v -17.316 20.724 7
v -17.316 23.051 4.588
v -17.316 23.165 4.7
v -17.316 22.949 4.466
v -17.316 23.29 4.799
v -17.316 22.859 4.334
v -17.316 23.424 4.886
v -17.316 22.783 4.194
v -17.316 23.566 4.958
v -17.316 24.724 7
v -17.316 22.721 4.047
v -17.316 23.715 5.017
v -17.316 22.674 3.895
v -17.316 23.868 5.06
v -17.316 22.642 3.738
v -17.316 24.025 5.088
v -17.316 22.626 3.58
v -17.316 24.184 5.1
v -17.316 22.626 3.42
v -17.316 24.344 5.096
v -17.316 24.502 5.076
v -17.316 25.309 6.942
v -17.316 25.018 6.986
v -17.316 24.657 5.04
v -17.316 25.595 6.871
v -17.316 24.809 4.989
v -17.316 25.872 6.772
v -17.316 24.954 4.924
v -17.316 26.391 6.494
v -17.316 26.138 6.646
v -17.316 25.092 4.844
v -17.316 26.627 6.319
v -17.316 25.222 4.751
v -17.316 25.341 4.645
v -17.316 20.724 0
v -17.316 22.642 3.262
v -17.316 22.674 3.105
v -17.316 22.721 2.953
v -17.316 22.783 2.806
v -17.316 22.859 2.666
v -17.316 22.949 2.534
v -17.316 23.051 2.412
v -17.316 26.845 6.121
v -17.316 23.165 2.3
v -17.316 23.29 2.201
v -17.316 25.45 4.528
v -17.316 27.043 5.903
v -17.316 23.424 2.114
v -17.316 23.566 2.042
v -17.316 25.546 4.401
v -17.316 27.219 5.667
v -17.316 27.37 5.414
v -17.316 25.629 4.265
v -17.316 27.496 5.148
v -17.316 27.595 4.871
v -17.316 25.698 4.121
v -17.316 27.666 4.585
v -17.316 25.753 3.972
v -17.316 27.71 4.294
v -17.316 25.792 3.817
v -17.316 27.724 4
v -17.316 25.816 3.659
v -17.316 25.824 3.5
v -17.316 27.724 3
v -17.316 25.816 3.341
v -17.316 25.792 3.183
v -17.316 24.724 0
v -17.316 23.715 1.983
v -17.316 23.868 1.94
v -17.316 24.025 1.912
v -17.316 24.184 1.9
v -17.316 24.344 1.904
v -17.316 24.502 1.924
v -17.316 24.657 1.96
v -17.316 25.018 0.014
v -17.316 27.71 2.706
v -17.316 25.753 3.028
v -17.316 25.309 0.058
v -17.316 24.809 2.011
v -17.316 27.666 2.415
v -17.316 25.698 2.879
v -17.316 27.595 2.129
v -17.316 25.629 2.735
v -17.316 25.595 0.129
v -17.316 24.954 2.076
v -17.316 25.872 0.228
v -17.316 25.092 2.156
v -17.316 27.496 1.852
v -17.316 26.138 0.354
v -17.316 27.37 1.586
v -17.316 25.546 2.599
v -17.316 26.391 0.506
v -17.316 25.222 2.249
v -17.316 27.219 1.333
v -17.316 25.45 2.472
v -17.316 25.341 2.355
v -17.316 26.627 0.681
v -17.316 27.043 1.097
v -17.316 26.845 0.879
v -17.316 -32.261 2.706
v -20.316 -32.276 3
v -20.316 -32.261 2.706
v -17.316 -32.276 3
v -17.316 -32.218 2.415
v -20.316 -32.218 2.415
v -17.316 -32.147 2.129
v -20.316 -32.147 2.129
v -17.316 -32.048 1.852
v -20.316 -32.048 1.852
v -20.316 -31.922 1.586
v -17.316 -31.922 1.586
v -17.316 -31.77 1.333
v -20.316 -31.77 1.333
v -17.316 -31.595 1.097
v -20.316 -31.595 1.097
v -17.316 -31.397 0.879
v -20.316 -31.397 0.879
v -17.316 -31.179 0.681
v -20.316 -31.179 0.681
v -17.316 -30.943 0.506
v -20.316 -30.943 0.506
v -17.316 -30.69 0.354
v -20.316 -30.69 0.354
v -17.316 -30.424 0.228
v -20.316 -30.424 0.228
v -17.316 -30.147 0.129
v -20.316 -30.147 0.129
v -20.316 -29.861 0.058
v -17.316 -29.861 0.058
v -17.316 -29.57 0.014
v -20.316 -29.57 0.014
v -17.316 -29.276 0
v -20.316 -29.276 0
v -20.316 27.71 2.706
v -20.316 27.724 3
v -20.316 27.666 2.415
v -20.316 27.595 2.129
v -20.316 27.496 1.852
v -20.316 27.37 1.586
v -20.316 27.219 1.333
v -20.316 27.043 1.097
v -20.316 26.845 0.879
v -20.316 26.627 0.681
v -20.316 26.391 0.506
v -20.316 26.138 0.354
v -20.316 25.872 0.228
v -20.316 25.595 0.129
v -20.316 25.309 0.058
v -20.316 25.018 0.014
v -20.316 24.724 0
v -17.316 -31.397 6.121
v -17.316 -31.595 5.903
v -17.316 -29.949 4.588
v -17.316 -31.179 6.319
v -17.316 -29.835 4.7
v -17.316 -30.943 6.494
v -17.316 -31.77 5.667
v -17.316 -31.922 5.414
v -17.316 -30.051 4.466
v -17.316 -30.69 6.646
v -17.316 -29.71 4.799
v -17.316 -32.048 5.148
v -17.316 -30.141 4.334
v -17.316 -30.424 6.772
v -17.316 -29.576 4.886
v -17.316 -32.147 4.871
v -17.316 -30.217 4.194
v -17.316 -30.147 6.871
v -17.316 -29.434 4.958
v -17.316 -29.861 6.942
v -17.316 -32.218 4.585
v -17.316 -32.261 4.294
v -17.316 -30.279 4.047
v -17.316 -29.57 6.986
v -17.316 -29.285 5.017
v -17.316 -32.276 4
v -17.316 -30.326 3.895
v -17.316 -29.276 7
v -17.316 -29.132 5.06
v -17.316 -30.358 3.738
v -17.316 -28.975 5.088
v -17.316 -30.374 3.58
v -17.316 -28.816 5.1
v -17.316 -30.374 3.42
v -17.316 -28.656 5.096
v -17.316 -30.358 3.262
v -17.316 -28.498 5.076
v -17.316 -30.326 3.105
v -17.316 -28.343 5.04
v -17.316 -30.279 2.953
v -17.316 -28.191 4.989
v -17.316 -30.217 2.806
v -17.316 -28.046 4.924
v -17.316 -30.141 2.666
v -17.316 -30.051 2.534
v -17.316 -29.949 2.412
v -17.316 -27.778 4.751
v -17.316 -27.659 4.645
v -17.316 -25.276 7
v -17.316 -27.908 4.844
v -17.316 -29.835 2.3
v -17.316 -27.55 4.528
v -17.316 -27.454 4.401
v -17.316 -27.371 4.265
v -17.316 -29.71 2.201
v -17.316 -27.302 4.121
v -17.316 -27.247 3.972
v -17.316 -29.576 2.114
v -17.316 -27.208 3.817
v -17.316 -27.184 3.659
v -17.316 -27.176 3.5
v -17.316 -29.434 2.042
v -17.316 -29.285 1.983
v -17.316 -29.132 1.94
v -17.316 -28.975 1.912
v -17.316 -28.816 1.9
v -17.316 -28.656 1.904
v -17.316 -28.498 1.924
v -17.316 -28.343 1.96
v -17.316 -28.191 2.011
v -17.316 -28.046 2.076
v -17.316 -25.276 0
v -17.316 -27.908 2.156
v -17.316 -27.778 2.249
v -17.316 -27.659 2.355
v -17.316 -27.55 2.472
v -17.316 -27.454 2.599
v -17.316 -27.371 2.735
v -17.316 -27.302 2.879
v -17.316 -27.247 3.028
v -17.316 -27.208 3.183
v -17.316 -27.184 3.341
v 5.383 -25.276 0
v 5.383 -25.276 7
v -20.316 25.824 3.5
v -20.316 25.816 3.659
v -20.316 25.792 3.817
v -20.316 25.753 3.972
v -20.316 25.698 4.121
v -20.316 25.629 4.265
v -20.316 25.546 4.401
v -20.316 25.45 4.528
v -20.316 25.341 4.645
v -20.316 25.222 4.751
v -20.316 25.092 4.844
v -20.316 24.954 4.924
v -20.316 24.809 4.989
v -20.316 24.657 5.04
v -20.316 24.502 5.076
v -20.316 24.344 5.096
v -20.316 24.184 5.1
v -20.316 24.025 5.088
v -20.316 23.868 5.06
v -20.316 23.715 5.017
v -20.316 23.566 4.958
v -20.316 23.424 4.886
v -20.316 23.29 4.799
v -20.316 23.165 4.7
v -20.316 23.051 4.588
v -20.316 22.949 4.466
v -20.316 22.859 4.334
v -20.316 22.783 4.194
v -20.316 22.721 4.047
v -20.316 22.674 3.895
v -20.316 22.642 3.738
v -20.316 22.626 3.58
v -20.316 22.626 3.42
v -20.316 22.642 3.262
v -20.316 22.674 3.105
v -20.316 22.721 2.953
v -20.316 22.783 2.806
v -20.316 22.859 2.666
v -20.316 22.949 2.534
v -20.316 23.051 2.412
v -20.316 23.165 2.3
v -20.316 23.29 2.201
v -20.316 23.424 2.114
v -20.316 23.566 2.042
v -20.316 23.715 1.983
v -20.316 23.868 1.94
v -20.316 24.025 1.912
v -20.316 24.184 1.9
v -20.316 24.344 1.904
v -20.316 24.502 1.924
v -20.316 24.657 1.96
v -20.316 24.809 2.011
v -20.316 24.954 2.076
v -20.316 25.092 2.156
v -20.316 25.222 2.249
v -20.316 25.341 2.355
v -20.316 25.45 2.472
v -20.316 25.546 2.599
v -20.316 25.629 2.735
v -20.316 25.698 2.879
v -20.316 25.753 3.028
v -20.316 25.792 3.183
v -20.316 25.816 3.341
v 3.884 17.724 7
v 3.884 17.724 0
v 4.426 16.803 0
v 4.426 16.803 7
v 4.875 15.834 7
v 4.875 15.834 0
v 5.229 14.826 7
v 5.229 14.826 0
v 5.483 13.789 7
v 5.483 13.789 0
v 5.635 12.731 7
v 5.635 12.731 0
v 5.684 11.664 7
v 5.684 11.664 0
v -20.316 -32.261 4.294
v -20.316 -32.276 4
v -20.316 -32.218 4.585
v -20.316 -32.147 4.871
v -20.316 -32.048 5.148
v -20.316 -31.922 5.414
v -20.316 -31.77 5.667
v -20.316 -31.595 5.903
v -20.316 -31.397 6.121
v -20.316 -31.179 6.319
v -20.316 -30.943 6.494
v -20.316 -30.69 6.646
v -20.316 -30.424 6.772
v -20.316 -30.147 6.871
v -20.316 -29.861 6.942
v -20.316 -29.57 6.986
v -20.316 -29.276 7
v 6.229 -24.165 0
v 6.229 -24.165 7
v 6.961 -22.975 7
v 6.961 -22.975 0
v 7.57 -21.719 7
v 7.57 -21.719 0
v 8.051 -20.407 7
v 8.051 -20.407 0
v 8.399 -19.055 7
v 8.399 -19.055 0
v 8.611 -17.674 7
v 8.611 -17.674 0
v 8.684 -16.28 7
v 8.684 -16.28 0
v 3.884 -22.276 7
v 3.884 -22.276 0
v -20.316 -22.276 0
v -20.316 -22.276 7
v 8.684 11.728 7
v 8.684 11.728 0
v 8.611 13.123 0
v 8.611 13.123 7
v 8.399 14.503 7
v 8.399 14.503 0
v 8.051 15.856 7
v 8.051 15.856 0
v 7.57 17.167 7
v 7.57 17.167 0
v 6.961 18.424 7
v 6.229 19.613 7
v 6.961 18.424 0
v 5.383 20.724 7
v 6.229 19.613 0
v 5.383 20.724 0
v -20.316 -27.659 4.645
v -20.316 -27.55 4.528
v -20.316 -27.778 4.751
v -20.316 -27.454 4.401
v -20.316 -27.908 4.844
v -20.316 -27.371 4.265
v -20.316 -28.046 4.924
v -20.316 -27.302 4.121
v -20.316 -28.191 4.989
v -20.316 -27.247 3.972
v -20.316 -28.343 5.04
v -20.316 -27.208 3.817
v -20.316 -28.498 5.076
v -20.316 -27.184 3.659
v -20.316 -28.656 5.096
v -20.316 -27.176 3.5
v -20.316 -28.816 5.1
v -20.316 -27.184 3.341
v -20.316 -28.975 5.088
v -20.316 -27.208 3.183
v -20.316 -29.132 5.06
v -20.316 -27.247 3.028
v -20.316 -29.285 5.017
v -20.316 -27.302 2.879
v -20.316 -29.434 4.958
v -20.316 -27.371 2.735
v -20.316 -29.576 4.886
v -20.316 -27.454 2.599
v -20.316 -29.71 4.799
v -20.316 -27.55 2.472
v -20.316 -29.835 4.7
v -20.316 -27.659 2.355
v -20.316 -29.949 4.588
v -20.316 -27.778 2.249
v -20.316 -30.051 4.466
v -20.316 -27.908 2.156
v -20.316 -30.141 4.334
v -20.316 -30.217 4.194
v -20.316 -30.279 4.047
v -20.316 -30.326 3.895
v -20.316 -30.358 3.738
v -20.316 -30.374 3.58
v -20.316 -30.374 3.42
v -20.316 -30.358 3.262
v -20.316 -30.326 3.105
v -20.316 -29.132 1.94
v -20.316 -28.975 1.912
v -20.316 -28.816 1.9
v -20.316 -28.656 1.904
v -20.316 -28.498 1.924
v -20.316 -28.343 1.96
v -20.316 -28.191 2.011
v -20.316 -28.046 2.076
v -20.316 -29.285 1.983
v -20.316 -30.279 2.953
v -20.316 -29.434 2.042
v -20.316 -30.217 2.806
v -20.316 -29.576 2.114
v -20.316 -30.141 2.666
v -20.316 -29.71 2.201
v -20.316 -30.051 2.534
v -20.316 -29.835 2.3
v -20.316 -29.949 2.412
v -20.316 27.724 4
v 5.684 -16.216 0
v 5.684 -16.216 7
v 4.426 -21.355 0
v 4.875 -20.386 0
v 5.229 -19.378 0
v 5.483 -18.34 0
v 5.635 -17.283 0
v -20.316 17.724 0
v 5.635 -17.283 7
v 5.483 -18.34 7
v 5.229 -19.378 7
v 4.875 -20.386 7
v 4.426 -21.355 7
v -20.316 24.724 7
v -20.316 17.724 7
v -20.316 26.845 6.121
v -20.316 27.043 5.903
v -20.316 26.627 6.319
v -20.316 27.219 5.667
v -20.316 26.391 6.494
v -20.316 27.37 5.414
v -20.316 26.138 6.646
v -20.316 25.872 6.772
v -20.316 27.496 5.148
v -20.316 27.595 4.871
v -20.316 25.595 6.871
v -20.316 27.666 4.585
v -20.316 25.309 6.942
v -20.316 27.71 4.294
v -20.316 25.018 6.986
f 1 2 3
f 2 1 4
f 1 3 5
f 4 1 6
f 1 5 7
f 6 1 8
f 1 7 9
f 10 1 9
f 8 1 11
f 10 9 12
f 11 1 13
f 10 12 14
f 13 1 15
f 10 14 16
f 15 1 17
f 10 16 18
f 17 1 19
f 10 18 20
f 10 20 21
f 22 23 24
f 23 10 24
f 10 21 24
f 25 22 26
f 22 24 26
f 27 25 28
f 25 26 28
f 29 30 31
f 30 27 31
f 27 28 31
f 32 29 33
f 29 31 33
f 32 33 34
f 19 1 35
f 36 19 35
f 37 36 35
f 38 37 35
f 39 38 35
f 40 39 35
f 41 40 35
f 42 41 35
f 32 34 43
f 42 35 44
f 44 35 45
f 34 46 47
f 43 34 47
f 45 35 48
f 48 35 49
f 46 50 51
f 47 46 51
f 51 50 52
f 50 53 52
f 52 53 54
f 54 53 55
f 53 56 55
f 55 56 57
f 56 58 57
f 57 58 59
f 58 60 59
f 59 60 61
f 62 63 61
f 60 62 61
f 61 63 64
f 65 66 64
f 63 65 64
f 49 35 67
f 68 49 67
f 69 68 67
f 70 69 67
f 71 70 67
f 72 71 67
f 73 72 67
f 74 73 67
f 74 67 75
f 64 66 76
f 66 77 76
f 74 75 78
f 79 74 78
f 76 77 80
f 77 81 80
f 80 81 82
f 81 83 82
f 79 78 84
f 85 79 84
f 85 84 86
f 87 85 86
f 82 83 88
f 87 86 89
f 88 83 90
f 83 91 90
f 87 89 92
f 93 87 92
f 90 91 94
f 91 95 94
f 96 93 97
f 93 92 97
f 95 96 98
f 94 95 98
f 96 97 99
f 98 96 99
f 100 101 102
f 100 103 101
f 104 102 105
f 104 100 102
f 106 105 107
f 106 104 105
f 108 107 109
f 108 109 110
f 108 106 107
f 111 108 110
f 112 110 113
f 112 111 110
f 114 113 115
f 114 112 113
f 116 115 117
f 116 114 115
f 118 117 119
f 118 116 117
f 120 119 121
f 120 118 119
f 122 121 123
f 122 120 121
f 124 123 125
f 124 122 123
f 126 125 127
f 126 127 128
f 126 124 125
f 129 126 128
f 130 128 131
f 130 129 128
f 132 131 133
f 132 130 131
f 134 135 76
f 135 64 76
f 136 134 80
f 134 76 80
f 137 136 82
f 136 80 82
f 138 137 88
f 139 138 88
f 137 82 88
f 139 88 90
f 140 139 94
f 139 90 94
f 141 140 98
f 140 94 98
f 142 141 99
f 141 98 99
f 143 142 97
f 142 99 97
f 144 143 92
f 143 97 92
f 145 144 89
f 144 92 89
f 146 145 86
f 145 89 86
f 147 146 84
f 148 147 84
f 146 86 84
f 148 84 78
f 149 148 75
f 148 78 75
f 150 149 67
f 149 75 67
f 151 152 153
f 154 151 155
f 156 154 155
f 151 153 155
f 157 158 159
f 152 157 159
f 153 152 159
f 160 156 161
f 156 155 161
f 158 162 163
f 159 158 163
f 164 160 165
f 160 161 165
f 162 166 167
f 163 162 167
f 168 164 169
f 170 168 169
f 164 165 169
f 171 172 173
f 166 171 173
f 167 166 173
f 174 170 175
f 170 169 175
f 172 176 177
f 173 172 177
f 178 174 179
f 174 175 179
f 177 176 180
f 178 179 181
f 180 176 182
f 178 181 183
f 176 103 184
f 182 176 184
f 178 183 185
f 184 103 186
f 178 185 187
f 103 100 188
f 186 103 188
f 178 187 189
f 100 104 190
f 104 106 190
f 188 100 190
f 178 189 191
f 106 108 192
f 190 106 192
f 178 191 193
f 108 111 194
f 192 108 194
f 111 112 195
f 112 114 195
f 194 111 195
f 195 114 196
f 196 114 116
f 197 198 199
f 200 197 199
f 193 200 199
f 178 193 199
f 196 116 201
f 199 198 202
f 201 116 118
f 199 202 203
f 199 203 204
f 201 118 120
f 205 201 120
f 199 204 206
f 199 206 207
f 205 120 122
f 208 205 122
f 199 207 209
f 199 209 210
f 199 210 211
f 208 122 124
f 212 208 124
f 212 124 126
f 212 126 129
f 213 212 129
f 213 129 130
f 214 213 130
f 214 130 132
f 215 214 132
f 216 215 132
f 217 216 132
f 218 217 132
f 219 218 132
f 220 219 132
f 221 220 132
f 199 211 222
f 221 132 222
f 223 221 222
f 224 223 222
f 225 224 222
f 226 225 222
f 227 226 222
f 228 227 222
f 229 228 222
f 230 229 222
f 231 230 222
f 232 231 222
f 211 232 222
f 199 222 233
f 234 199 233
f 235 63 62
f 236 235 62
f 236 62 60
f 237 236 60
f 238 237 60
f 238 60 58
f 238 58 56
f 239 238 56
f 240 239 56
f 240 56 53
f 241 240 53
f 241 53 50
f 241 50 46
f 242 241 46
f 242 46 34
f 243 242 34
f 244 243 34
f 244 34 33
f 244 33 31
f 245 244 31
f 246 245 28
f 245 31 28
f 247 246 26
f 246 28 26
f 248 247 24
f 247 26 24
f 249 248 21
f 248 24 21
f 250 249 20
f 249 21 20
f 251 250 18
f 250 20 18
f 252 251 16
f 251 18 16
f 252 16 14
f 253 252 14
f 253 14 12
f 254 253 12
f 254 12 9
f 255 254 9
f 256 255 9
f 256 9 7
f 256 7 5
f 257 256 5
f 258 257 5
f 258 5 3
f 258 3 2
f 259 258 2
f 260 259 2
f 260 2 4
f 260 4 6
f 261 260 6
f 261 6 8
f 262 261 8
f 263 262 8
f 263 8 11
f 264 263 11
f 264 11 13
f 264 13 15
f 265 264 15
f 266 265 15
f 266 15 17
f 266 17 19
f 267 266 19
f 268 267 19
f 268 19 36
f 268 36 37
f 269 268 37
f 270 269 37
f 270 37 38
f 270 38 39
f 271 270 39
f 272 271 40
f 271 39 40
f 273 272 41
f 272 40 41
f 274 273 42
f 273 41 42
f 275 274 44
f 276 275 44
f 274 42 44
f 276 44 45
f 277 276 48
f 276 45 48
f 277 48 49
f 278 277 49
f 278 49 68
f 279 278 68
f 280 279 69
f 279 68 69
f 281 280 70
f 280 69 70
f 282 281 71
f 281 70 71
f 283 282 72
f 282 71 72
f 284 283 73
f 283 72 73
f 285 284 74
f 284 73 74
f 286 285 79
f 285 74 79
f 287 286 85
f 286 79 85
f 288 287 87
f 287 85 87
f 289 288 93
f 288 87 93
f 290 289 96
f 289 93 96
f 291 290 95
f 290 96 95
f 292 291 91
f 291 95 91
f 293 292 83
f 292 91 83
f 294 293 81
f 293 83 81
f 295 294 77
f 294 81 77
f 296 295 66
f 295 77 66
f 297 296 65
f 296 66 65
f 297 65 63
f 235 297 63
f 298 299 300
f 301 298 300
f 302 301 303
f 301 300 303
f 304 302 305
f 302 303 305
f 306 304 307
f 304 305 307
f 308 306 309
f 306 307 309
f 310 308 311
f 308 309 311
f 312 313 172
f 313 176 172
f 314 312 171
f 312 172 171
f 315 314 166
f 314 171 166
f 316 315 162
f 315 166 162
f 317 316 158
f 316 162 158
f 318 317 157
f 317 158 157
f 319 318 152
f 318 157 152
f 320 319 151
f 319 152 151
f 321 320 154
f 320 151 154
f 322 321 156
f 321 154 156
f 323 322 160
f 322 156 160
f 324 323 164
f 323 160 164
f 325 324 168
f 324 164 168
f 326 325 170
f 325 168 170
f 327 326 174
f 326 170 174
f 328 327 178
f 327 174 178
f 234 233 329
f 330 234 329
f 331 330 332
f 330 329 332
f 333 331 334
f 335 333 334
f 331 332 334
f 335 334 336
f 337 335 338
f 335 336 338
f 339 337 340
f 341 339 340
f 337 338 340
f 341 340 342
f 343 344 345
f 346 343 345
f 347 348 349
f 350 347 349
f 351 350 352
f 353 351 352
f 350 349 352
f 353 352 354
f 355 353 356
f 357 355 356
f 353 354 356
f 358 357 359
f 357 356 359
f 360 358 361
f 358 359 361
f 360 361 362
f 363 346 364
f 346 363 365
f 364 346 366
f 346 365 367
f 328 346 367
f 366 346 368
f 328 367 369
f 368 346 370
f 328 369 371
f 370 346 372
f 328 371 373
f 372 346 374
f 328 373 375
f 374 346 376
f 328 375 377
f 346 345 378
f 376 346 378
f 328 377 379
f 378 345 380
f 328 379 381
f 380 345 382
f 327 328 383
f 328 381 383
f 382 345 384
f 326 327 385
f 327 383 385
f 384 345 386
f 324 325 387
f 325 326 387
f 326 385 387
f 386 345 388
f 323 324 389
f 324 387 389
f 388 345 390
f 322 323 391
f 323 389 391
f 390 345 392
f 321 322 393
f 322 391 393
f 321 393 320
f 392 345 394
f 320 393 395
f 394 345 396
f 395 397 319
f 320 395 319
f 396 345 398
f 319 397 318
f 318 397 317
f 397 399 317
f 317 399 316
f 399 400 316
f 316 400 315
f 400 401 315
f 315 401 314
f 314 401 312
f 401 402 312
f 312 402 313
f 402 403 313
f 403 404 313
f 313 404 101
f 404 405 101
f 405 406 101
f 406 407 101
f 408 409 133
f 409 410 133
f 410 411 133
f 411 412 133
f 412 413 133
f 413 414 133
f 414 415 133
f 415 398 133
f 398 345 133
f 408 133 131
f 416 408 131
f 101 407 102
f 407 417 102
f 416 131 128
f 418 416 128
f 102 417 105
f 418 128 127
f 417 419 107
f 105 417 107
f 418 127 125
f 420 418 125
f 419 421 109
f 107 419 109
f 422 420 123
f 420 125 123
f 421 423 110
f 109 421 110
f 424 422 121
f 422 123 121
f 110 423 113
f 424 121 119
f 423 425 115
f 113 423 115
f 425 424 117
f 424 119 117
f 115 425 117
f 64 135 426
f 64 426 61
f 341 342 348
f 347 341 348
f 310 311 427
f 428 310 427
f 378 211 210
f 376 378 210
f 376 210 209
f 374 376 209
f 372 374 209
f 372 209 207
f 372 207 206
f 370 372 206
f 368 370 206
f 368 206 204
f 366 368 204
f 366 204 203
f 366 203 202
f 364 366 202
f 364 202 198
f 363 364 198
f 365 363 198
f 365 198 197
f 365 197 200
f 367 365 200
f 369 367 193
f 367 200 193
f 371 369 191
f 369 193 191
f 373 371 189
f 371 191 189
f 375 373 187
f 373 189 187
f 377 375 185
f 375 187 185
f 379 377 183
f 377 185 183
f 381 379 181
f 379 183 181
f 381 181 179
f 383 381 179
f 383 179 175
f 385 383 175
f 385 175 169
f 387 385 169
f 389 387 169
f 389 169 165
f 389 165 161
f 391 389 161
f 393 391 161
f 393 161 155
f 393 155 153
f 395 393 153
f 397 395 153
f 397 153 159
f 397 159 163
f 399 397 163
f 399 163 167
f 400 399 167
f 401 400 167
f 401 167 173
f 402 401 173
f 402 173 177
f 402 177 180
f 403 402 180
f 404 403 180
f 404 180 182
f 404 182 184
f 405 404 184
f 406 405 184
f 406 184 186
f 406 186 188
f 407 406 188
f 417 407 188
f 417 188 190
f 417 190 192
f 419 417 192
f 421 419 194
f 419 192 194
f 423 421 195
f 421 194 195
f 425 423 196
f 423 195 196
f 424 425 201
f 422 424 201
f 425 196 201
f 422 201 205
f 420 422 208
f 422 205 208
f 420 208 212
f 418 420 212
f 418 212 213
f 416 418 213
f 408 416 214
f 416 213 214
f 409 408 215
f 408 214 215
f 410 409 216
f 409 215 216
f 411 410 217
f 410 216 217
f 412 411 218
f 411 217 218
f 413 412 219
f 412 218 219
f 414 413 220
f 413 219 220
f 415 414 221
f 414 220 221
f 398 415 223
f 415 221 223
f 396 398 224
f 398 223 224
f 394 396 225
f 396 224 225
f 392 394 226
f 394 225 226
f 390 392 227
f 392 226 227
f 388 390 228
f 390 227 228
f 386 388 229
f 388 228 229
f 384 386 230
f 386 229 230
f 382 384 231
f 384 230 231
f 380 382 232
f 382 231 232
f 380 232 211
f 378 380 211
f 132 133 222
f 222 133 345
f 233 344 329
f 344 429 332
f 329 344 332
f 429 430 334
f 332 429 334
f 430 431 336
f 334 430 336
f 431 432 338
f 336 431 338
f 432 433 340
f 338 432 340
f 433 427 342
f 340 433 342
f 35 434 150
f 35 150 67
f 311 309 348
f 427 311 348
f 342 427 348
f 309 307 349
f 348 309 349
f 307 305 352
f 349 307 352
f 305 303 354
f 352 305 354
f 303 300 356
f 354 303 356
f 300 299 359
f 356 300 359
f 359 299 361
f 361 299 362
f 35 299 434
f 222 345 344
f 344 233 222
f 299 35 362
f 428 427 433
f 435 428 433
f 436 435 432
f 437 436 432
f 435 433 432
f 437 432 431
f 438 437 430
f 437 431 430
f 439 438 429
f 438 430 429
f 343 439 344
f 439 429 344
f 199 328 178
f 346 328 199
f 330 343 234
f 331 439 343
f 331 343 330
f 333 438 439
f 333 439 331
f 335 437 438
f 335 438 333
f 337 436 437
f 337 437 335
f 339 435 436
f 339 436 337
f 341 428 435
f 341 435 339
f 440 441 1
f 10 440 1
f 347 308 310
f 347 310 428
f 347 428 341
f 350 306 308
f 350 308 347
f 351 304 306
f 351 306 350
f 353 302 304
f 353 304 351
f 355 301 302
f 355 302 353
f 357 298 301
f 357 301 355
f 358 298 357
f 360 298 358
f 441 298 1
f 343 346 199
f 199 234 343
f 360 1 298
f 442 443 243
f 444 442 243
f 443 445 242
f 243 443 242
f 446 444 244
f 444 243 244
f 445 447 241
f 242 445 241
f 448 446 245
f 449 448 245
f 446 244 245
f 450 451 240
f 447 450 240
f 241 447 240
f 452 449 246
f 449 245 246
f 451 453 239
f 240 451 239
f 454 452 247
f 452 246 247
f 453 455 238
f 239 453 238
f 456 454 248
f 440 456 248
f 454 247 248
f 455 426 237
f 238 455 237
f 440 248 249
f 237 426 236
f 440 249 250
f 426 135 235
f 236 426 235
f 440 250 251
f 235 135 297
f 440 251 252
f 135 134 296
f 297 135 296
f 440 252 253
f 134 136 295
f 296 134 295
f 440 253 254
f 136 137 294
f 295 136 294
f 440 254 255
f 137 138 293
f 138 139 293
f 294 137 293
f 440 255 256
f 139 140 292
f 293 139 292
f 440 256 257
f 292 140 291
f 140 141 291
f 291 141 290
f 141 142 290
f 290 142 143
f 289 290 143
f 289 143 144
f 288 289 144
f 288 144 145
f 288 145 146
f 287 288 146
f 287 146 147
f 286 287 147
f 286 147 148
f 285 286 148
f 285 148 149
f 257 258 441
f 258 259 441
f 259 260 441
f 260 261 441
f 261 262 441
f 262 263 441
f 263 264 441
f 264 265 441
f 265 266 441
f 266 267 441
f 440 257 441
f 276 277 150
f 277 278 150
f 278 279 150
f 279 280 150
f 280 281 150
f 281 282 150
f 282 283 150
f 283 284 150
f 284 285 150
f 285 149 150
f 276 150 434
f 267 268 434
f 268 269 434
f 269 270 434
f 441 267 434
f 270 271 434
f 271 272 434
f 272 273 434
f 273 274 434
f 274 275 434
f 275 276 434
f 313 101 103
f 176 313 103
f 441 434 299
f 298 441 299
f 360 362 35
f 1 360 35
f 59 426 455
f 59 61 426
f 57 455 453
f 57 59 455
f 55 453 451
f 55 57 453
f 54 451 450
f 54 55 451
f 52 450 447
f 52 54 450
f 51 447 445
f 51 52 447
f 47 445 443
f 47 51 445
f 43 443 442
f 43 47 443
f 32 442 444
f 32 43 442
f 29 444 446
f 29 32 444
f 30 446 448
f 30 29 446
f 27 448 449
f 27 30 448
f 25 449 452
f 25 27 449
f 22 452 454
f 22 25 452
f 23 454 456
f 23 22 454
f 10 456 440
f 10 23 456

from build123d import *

# Parameters (mm, degrees)
F0_W     = 3
F0_H     = 7
F1_DEPTH = 7
F2_R     = 3
F3_R     = 1.6
F4_DEPTH = 25
F5_R     = 1.6
F6_DEPTH = 25


with BuildPart() as f1:
    # F0 (on Top) → F1 (new body)
    with BuildSketch(Plane.XY):
        with Locations((-18.815929, 24.224132)):
            Rectangle(F0_W, F0_H)
        with BuildLine():
            Line((5.684071, 11.664157), (5.684071, -16.215892))
            ThreePointArc((5.684071, -16.215892), (5.228779, -19.377972), (3.884071, -22.275868))
            Line((3.884071, -22.275868), (-20.315929, -22.275868))
            Line((-20.315929, -22.275868), (-20.315929, -25.275868))
            Line((-20.315929, -25.275868), (-17.315929, -25.275868))
            Line((-17.315929, -25.275868), (5.382678, -25.275868))
            ThreePointArc((5.382678, -25.275868), (7.827057, -21.069053), (8.684071, -16.279711))
            Line((8.684071, -16.279711), (8.684071, 11.727975))
            ThreePointArc((8.684071, 11.727975), (7.827057, 16.517318), (5.382678, 20.724132))
            Line((5.382678, 20.724132), (-17.315929, 20.724132))
            Line((-17.315929, 20.724132), (-20.315929, 20.724132))
            Line((-20.315929, 20.724132), (-20.315929, 17.724132))
            Line((-20.315929, 17.724132), (3.884071, 17.724132))
            ThreePointArc((3.884071, 17.724132), (5.228779, 14.826237), (5.684071, 11.664157))
        make_face()
        with Locations((-18.815929, -28.775868)):
            Rectangle(F0_W, F0_H)
    extrude(amount=F1_DEPTH)

    # F2
    f2_edges = [f1.edges().sort_by_distance(p)[0] for p in [
        (-18.815929, 27.724132, 0),
        (-18.815929, 27.724132, 7),
        (-18.815929, -32.275868, 0),
        (-18.815929, -32.275868, 7),
    ]]
    fillet(f2_edges, radius=F2_R)

    # F3 (on face) → F4 (cut)
    with BuildSketch(Plane.YZ.offset(-17.315929)):
        with Locations((-28.775868, 3.5)):
            Circle(F3_R)
    extrude(amount=-F4_DEPTH, mode=Mode.SUBTRACT)

    # F5 (on face) → F6 (cut)
    with BuildSketch(Plane.YZ.offset(-17.315929)):
        with Locations((24.224132, 3.5)):
            Circle(F5_R)
    extrude(amount=-F6_DEPTH, mode=Mode.SUBTRACT)


solid = f1.part
